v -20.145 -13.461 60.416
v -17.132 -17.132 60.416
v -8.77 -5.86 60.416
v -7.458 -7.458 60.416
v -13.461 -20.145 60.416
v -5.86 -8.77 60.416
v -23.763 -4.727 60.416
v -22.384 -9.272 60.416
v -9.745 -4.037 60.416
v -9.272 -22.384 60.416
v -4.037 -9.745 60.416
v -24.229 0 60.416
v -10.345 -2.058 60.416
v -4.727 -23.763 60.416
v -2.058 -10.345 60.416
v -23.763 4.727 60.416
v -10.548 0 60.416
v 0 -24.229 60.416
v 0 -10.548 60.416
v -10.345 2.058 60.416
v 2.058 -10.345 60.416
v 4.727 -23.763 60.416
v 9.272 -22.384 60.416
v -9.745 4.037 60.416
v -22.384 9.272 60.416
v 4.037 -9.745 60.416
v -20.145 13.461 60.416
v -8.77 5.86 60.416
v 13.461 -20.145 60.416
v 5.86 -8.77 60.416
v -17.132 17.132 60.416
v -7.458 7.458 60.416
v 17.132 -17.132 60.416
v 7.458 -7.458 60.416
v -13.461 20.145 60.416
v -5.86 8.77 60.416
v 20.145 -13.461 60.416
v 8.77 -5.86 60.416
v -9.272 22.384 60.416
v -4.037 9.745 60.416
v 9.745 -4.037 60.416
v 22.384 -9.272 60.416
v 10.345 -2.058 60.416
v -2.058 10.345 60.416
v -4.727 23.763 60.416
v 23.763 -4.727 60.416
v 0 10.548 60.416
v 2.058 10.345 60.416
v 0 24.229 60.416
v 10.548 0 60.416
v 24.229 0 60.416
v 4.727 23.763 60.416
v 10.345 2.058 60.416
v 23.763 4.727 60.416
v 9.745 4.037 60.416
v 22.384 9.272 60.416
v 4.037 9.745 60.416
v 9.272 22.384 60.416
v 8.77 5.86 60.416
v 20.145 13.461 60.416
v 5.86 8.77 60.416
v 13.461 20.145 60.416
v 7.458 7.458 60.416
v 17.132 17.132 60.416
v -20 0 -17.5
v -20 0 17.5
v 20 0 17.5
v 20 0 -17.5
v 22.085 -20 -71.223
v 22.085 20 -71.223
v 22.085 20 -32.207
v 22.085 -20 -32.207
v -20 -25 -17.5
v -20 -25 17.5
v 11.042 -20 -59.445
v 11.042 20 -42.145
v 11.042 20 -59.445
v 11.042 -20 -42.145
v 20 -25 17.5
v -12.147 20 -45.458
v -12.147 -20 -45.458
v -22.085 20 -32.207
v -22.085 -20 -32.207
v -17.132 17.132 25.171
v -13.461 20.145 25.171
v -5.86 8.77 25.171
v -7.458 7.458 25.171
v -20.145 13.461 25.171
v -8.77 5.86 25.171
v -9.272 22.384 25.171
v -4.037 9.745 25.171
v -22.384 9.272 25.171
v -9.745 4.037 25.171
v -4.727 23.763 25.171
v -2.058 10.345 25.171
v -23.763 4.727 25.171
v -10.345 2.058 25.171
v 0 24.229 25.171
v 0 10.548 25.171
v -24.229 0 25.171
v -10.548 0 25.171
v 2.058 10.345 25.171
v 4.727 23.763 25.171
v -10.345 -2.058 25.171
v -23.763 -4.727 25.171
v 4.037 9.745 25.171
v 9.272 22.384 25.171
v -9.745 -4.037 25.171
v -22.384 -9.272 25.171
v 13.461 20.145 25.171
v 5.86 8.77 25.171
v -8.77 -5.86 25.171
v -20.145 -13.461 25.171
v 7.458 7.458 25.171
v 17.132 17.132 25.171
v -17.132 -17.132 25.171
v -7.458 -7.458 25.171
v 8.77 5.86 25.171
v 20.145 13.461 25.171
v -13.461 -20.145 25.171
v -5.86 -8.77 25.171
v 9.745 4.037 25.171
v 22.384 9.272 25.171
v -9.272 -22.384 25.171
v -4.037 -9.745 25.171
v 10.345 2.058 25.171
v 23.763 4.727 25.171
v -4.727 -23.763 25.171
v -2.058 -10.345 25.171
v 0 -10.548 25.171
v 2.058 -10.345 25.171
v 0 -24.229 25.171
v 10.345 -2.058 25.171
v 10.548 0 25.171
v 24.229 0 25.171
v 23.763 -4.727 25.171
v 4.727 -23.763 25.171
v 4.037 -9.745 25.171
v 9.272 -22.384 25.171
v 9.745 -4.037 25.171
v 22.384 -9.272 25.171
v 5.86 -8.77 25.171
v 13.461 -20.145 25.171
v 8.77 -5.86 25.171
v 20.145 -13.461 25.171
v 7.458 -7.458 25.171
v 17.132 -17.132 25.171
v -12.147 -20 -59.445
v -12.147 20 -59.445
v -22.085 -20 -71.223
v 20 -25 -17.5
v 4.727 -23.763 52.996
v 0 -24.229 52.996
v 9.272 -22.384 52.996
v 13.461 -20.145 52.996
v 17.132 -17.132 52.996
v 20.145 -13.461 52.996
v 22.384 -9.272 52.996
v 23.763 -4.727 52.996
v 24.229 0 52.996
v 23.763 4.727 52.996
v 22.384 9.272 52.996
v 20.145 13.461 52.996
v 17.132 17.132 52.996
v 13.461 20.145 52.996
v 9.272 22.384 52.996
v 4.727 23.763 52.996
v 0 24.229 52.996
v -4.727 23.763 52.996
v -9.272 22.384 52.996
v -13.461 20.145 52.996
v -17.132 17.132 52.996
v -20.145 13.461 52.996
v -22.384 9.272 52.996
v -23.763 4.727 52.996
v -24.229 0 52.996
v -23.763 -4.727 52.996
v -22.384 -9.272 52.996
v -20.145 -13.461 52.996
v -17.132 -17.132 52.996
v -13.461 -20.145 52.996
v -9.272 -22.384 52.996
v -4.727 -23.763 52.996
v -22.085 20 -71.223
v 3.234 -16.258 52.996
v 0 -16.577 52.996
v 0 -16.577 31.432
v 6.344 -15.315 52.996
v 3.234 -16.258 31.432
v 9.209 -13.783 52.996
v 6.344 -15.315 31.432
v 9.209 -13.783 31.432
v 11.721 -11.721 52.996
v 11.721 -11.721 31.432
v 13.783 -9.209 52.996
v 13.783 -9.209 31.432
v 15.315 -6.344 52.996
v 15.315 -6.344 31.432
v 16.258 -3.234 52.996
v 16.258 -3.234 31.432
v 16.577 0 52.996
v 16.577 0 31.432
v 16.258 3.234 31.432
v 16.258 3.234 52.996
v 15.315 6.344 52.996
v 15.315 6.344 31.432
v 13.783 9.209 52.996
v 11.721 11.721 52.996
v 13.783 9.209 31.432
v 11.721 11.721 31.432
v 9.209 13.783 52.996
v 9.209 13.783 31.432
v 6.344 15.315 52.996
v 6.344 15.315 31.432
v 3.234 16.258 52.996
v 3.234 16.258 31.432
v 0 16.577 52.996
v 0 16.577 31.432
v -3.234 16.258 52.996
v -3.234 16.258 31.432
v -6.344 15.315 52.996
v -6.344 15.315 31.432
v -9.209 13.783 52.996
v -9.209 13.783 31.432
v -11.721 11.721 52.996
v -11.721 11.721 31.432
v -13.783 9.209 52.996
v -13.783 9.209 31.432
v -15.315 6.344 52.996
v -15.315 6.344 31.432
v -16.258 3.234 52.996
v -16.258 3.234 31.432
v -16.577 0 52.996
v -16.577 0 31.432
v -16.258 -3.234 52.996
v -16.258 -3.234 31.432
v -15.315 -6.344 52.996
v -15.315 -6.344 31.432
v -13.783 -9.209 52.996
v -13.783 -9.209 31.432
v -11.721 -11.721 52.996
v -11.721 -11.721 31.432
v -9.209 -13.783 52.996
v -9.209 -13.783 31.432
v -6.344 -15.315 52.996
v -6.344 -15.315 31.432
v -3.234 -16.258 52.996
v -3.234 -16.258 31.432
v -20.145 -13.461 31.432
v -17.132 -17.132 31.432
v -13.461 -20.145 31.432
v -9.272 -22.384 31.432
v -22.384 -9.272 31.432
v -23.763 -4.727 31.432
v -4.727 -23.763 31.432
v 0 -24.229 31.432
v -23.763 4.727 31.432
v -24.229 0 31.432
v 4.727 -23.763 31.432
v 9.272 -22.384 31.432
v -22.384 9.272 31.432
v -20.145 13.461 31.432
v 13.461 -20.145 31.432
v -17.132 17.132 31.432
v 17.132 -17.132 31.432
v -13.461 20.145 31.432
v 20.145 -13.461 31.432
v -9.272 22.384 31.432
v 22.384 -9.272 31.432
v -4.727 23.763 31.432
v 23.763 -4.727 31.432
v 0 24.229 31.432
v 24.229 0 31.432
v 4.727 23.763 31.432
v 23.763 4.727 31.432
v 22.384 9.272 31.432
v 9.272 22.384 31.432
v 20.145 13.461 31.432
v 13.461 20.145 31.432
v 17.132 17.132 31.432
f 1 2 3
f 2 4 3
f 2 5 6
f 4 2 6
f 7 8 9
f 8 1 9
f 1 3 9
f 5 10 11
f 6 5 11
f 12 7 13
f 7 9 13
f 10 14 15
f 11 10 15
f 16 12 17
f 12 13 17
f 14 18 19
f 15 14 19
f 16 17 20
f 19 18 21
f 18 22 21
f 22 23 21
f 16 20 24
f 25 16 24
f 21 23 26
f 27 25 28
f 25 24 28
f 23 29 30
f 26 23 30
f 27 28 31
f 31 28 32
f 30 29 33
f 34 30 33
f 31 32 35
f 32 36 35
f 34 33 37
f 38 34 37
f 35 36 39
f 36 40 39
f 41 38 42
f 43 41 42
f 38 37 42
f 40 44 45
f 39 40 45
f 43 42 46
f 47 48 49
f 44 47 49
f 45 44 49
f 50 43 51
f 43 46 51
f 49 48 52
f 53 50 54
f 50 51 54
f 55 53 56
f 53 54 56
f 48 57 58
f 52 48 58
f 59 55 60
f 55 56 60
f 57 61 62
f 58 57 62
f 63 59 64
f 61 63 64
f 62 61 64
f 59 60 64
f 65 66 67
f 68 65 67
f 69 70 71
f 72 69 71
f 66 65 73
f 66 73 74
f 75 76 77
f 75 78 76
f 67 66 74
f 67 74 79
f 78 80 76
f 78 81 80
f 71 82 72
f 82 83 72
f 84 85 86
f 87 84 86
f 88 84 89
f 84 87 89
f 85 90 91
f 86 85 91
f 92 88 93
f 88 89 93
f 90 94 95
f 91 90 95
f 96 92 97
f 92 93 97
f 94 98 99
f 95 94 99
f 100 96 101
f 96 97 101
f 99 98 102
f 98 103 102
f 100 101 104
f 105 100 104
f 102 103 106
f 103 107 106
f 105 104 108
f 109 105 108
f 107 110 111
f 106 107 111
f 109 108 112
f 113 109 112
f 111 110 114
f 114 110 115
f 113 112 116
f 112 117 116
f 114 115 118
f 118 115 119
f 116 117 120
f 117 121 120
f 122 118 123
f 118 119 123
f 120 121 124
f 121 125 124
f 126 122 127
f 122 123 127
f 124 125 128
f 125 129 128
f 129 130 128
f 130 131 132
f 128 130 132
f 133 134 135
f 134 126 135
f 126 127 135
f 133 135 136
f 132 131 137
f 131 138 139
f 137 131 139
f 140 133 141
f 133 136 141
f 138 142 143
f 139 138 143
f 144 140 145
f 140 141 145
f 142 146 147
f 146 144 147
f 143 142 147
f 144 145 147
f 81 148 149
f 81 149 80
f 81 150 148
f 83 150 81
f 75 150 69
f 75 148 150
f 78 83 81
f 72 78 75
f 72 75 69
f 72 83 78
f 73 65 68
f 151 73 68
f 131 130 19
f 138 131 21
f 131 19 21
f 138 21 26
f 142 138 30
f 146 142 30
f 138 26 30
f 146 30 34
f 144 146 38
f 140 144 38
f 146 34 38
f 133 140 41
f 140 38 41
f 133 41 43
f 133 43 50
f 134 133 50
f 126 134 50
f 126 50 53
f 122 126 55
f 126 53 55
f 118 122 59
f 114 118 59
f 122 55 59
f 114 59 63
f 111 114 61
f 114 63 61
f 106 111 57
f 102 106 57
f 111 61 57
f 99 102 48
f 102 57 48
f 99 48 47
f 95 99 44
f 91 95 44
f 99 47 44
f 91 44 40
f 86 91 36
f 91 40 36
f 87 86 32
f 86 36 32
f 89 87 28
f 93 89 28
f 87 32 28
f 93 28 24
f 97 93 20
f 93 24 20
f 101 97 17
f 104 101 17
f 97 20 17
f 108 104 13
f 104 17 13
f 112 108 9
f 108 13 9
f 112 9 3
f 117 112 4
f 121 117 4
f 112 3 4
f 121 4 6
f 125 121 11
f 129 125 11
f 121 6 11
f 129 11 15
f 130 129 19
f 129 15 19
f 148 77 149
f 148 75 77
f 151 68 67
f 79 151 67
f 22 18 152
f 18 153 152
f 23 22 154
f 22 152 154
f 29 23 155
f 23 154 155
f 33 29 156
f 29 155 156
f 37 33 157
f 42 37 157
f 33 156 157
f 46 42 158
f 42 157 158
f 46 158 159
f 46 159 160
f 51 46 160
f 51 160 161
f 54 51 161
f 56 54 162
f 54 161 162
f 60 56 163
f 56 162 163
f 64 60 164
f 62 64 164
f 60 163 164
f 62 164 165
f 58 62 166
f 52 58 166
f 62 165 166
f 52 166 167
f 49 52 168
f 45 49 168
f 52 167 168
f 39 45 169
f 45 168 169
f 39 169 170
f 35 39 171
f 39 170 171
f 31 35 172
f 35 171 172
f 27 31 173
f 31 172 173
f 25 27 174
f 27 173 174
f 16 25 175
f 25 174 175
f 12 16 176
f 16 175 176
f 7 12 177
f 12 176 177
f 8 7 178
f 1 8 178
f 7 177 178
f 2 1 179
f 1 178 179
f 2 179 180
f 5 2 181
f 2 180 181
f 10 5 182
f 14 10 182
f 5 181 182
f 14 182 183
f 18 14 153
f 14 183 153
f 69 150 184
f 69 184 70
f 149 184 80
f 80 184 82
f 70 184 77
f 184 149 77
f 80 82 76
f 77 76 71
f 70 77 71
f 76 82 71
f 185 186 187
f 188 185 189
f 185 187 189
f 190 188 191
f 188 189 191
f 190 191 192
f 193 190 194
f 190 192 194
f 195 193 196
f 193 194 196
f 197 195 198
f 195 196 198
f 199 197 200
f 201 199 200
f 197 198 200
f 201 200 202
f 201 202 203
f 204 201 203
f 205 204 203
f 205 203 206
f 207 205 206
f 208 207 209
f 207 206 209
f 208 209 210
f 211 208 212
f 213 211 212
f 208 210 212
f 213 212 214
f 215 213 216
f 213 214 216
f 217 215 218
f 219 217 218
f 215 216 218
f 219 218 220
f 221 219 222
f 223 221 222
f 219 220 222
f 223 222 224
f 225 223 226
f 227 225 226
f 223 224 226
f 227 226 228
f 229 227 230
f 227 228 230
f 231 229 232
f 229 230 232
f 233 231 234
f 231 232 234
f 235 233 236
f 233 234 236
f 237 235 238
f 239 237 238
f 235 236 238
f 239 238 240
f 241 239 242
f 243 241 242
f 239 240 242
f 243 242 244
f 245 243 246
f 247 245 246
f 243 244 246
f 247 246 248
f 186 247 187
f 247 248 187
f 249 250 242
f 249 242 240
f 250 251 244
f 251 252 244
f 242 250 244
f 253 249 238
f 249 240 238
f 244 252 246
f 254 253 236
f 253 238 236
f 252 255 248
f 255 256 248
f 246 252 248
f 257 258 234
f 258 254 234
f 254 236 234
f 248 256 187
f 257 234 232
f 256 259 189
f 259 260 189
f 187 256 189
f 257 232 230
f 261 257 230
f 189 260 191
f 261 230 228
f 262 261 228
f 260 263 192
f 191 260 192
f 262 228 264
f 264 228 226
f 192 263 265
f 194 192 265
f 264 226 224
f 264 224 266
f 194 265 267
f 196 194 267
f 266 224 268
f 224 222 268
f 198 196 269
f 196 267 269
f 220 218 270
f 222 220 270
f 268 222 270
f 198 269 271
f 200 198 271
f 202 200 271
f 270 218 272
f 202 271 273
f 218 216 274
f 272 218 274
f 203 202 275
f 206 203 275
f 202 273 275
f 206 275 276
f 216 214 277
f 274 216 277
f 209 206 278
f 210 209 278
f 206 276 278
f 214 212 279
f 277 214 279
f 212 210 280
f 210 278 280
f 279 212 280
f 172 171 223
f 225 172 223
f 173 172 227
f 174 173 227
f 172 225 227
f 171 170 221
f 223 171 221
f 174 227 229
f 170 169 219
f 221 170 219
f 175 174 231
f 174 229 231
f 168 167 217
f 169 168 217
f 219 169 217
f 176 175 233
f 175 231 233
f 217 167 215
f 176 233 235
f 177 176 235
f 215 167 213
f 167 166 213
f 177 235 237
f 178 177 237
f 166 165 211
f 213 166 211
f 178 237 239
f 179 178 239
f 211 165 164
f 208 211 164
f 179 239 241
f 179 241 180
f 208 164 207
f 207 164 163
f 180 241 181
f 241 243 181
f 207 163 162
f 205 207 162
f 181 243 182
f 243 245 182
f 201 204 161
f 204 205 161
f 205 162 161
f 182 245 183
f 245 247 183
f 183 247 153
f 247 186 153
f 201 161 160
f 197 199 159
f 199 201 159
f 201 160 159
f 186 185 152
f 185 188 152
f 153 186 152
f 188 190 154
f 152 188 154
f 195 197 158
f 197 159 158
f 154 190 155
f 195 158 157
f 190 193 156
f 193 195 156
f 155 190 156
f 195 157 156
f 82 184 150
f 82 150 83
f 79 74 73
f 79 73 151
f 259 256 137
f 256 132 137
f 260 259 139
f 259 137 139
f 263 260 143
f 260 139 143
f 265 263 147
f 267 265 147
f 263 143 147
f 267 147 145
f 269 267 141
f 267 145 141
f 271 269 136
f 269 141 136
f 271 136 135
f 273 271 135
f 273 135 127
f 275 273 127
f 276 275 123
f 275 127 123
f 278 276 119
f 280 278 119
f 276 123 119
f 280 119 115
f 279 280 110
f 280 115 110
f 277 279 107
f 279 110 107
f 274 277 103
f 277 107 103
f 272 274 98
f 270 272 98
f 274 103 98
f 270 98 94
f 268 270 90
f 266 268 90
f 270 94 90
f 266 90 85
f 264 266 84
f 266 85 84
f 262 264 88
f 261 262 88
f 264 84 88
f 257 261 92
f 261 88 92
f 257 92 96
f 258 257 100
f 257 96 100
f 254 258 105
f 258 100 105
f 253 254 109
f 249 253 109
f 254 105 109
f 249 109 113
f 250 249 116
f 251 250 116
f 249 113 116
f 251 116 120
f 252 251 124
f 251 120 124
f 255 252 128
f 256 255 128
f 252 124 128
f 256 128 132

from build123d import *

# Parameters (mm, degrees)
F0_W     = 40
F0_H     = 35
F1_DEPTH = 25
F4_W     = 44.1695
F4_H     = 39.016396
F5_DEPTH = 20


with BuildPart() as f1:
    # F0 (on Front) → F1 (new body)
    with BuildSketch(Plane.XZ):
        Rectangle(F0_W, F0_H)
    extrude(amount=F1_DEPTH)


with BuildPart() as f3:
    # F2 (on Right) → F3 (revolve)
    with BuildSketch(Plane.YZ):
        Polygon((-10.547892, 60.416196), (-24.228537, 60.416196), (-24.228537, 52.996188), (-16.576651, 52.996188), (-16.576651, 31.431779), (-24.228537, 31.431779), (-24.228537, 25.171148), (-10.547892, 25.171148), align=None)
    revolve(axis=Axis((0, 0, 32.526851), (0, 0, 1)))


with BuildPart() as f5:
    # F4 (on Front) → F5 (new body, symmetric)
    with BuildSketch(Plane.XZ):
        with Locations((0, -51.715124)):
            Rectangle(F4_W, F4_H)
        Polygon((-12.14661, -59.444785), (-12.14661, -45.457777), (11.042379, -42.145062), (11.042379, -59.444785), align=None, mode=Mode.SUBTRACT)
    extrude(amount=F5_DEPTH, both=True)


solid = Compound([f1.part, f3.part, f5.part])
